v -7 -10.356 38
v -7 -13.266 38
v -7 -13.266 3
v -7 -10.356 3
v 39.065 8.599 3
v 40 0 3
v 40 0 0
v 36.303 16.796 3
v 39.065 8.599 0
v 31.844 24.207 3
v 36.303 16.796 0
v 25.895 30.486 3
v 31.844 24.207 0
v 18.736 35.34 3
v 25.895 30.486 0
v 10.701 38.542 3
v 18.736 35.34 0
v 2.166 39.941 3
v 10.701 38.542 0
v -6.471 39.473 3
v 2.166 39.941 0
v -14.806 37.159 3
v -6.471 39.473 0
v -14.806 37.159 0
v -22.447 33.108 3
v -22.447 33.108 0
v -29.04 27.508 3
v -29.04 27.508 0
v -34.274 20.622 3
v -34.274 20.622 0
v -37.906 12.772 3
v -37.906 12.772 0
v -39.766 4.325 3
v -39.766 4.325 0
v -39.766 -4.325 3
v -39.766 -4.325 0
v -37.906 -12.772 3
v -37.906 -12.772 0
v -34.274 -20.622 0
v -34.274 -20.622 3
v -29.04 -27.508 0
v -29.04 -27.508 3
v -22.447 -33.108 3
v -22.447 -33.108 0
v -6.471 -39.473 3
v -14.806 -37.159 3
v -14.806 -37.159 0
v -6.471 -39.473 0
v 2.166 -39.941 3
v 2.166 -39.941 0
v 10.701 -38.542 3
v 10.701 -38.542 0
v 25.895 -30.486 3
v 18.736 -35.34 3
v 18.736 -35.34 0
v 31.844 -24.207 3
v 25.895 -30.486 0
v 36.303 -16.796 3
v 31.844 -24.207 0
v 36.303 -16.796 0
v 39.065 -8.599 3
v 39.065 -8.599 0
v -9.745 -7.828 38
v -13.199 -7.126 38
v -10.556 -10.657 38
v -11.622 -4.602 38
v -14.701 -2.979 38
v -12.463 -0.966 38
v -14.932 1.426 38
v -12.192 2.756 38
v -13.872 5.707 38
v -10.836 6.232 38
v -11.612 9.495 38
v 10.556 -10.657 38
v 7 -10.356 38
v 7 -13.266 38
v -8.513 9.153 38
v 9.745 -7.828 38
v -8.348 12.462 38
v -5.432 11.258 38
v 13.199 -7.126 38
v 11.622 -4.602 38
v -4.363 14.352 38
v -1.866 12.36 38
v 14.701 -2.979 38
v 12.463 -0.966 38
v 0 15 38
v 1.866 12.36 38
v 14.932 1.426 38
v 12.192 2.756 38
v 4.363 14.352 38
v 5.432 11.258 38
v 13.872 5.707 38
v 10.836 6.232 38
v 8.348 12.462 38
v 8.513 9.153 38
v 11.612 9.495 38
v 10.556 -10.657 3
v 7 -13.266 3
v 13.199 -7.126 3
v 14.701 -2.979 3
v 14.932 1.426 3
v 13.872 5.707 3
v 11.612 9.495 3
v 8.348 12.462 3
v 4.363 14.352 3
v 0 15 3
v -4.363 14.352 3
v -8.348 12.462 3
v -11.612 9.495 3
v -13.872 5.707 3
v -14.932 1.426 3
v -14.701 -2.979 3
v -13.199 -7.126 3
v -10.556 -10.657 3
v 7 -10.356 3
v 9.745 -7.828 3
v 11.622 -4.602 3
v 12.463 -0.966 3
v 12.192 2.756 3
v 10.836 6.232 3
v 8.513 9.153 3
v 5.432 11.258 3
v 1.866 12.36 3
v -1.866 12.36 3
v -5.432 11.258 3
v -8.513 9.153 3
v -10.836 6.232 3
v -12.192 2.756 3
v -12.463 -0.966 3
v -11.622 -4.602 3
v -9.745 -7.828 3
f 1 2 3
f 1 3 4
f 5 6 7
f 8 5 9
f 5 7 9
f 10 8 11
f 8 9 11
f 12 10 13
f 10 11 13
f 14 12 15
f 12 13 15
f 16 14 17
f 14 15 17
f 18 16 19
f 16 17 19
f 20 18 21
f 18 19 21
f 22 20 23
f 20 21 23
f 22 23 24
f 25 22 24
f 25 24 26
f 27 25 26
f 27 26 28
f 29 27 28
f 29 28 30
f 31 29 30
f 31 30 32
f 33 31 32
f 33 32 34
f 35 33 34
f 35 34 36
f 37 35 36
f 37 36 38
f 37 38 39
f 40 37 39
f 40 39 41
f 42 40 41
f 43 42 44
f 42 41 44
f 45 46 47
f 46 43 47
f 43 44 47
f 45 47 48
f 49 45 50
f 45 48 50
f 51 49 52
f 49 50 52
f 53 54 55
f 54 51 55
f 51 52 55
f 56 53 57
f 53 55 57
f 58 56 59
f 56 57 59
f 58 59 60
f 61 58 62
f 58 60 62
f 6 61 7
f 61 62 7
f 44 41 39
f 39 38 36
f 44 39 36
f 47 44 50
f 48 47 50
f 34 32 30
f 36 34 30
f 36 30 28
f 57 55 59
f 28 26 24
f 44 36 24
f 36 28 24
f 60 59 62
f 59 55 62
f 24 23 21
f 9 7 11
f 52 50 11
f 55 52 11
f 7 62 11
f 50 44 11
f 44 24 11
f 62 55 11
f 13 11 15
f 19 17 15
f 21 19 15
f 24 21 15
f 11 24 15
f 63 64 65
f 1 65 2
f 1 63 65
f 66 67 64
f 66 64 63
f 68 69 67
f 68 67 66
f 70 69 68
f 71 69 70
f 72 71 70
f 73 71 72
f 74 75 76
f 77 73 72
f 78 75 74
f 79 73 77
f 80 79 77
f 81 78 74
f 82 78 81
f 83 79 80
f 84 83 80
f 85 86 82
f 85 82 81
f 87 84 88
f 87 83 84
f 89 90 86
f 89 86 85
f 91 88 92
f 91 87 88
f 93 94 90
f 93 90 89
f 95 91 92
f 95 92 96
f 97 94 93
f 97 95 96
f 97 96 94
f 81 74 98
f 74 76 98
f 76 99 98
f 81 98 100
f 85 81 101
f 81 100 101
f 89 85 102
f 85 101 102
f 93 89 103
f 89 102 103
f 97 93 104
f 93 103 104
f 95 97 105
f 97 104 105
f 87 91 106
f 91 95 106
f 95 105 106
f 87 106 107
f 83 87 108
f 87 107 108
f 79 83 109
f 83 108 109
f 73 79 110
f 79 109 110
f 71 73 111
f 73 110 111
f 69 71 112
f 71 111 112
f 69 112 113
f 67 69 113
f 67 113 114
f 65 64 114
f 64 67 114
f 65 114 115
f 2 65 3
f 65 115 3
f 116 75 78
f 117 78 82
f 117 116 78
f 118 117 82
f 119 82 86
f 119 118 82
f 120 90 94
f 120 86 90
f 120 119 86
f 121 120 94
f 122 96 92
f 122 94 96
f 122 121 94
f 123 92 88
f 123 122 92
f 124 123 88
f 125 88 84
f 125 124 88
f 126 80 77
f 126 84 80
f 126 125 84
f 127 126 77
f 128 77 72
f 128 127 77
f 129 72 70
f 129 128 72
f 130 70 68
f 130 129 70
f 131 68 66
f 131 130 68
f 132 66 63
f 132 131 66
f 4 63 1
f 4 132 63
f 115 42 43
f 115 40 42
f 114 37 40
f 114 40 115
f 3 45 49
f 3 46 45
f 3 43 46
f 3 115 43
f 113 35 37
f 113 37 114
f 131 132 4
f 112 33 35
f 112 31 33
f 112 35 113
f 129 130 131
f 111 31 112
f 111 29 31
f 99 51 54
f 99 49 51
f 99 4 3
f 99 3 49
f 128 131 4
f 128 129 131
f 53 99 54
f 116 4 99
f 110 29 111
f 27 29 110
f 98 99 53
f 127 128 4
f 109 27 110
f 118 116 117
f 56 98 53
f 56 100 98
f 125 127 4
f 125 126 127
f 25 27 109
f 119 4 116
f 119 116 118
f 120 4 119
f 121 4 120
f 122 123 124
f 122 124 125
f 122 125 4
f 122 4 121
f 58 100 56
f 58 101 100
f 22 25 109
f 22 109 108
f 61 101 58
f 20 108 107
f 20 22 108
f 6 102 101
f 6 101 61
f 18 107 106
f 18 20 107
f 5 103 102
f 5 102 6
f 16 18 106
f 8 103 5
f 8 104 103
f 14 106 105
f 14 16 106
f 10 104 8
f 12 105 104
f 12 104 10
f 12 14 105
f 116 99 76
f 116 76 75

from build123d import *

# Parameters (mm, degrees)
F0_R     = 40
F1_DEPTH = 3
F2_R     = 15
F2_R_2   = 12.5
F3_DEPTH = 35
F4_W     = 14
F4_H     = 50
F5_DEPTH = 35


with BuildPart() as f1:
    # F0 (on Top) → F1 (new body)
    with BuildSketch(Plane.XY):
        Circle(F0_R)
    extrude(amount=F1_DEPTH)

    # F2 (on face) → F3 (join)
    with BuildSketch(Plane.XY.offset(3)):
        Circle(F2_R)
        Circle(F2_R_2, mode=Mode.SUBTRACT)
    extrude(amount=F3_DEPTH)

    # F4 (on face) → F5 (cut)
    with BuildSketch(Plane.XY.offset(38)):
        with Locations((0, -25)):
            Rectangle(F4_W, F4_H)
    extrude(amount=-F5_DEPTH, mode=Mode.SUBTRACT)


solid = f1.part
